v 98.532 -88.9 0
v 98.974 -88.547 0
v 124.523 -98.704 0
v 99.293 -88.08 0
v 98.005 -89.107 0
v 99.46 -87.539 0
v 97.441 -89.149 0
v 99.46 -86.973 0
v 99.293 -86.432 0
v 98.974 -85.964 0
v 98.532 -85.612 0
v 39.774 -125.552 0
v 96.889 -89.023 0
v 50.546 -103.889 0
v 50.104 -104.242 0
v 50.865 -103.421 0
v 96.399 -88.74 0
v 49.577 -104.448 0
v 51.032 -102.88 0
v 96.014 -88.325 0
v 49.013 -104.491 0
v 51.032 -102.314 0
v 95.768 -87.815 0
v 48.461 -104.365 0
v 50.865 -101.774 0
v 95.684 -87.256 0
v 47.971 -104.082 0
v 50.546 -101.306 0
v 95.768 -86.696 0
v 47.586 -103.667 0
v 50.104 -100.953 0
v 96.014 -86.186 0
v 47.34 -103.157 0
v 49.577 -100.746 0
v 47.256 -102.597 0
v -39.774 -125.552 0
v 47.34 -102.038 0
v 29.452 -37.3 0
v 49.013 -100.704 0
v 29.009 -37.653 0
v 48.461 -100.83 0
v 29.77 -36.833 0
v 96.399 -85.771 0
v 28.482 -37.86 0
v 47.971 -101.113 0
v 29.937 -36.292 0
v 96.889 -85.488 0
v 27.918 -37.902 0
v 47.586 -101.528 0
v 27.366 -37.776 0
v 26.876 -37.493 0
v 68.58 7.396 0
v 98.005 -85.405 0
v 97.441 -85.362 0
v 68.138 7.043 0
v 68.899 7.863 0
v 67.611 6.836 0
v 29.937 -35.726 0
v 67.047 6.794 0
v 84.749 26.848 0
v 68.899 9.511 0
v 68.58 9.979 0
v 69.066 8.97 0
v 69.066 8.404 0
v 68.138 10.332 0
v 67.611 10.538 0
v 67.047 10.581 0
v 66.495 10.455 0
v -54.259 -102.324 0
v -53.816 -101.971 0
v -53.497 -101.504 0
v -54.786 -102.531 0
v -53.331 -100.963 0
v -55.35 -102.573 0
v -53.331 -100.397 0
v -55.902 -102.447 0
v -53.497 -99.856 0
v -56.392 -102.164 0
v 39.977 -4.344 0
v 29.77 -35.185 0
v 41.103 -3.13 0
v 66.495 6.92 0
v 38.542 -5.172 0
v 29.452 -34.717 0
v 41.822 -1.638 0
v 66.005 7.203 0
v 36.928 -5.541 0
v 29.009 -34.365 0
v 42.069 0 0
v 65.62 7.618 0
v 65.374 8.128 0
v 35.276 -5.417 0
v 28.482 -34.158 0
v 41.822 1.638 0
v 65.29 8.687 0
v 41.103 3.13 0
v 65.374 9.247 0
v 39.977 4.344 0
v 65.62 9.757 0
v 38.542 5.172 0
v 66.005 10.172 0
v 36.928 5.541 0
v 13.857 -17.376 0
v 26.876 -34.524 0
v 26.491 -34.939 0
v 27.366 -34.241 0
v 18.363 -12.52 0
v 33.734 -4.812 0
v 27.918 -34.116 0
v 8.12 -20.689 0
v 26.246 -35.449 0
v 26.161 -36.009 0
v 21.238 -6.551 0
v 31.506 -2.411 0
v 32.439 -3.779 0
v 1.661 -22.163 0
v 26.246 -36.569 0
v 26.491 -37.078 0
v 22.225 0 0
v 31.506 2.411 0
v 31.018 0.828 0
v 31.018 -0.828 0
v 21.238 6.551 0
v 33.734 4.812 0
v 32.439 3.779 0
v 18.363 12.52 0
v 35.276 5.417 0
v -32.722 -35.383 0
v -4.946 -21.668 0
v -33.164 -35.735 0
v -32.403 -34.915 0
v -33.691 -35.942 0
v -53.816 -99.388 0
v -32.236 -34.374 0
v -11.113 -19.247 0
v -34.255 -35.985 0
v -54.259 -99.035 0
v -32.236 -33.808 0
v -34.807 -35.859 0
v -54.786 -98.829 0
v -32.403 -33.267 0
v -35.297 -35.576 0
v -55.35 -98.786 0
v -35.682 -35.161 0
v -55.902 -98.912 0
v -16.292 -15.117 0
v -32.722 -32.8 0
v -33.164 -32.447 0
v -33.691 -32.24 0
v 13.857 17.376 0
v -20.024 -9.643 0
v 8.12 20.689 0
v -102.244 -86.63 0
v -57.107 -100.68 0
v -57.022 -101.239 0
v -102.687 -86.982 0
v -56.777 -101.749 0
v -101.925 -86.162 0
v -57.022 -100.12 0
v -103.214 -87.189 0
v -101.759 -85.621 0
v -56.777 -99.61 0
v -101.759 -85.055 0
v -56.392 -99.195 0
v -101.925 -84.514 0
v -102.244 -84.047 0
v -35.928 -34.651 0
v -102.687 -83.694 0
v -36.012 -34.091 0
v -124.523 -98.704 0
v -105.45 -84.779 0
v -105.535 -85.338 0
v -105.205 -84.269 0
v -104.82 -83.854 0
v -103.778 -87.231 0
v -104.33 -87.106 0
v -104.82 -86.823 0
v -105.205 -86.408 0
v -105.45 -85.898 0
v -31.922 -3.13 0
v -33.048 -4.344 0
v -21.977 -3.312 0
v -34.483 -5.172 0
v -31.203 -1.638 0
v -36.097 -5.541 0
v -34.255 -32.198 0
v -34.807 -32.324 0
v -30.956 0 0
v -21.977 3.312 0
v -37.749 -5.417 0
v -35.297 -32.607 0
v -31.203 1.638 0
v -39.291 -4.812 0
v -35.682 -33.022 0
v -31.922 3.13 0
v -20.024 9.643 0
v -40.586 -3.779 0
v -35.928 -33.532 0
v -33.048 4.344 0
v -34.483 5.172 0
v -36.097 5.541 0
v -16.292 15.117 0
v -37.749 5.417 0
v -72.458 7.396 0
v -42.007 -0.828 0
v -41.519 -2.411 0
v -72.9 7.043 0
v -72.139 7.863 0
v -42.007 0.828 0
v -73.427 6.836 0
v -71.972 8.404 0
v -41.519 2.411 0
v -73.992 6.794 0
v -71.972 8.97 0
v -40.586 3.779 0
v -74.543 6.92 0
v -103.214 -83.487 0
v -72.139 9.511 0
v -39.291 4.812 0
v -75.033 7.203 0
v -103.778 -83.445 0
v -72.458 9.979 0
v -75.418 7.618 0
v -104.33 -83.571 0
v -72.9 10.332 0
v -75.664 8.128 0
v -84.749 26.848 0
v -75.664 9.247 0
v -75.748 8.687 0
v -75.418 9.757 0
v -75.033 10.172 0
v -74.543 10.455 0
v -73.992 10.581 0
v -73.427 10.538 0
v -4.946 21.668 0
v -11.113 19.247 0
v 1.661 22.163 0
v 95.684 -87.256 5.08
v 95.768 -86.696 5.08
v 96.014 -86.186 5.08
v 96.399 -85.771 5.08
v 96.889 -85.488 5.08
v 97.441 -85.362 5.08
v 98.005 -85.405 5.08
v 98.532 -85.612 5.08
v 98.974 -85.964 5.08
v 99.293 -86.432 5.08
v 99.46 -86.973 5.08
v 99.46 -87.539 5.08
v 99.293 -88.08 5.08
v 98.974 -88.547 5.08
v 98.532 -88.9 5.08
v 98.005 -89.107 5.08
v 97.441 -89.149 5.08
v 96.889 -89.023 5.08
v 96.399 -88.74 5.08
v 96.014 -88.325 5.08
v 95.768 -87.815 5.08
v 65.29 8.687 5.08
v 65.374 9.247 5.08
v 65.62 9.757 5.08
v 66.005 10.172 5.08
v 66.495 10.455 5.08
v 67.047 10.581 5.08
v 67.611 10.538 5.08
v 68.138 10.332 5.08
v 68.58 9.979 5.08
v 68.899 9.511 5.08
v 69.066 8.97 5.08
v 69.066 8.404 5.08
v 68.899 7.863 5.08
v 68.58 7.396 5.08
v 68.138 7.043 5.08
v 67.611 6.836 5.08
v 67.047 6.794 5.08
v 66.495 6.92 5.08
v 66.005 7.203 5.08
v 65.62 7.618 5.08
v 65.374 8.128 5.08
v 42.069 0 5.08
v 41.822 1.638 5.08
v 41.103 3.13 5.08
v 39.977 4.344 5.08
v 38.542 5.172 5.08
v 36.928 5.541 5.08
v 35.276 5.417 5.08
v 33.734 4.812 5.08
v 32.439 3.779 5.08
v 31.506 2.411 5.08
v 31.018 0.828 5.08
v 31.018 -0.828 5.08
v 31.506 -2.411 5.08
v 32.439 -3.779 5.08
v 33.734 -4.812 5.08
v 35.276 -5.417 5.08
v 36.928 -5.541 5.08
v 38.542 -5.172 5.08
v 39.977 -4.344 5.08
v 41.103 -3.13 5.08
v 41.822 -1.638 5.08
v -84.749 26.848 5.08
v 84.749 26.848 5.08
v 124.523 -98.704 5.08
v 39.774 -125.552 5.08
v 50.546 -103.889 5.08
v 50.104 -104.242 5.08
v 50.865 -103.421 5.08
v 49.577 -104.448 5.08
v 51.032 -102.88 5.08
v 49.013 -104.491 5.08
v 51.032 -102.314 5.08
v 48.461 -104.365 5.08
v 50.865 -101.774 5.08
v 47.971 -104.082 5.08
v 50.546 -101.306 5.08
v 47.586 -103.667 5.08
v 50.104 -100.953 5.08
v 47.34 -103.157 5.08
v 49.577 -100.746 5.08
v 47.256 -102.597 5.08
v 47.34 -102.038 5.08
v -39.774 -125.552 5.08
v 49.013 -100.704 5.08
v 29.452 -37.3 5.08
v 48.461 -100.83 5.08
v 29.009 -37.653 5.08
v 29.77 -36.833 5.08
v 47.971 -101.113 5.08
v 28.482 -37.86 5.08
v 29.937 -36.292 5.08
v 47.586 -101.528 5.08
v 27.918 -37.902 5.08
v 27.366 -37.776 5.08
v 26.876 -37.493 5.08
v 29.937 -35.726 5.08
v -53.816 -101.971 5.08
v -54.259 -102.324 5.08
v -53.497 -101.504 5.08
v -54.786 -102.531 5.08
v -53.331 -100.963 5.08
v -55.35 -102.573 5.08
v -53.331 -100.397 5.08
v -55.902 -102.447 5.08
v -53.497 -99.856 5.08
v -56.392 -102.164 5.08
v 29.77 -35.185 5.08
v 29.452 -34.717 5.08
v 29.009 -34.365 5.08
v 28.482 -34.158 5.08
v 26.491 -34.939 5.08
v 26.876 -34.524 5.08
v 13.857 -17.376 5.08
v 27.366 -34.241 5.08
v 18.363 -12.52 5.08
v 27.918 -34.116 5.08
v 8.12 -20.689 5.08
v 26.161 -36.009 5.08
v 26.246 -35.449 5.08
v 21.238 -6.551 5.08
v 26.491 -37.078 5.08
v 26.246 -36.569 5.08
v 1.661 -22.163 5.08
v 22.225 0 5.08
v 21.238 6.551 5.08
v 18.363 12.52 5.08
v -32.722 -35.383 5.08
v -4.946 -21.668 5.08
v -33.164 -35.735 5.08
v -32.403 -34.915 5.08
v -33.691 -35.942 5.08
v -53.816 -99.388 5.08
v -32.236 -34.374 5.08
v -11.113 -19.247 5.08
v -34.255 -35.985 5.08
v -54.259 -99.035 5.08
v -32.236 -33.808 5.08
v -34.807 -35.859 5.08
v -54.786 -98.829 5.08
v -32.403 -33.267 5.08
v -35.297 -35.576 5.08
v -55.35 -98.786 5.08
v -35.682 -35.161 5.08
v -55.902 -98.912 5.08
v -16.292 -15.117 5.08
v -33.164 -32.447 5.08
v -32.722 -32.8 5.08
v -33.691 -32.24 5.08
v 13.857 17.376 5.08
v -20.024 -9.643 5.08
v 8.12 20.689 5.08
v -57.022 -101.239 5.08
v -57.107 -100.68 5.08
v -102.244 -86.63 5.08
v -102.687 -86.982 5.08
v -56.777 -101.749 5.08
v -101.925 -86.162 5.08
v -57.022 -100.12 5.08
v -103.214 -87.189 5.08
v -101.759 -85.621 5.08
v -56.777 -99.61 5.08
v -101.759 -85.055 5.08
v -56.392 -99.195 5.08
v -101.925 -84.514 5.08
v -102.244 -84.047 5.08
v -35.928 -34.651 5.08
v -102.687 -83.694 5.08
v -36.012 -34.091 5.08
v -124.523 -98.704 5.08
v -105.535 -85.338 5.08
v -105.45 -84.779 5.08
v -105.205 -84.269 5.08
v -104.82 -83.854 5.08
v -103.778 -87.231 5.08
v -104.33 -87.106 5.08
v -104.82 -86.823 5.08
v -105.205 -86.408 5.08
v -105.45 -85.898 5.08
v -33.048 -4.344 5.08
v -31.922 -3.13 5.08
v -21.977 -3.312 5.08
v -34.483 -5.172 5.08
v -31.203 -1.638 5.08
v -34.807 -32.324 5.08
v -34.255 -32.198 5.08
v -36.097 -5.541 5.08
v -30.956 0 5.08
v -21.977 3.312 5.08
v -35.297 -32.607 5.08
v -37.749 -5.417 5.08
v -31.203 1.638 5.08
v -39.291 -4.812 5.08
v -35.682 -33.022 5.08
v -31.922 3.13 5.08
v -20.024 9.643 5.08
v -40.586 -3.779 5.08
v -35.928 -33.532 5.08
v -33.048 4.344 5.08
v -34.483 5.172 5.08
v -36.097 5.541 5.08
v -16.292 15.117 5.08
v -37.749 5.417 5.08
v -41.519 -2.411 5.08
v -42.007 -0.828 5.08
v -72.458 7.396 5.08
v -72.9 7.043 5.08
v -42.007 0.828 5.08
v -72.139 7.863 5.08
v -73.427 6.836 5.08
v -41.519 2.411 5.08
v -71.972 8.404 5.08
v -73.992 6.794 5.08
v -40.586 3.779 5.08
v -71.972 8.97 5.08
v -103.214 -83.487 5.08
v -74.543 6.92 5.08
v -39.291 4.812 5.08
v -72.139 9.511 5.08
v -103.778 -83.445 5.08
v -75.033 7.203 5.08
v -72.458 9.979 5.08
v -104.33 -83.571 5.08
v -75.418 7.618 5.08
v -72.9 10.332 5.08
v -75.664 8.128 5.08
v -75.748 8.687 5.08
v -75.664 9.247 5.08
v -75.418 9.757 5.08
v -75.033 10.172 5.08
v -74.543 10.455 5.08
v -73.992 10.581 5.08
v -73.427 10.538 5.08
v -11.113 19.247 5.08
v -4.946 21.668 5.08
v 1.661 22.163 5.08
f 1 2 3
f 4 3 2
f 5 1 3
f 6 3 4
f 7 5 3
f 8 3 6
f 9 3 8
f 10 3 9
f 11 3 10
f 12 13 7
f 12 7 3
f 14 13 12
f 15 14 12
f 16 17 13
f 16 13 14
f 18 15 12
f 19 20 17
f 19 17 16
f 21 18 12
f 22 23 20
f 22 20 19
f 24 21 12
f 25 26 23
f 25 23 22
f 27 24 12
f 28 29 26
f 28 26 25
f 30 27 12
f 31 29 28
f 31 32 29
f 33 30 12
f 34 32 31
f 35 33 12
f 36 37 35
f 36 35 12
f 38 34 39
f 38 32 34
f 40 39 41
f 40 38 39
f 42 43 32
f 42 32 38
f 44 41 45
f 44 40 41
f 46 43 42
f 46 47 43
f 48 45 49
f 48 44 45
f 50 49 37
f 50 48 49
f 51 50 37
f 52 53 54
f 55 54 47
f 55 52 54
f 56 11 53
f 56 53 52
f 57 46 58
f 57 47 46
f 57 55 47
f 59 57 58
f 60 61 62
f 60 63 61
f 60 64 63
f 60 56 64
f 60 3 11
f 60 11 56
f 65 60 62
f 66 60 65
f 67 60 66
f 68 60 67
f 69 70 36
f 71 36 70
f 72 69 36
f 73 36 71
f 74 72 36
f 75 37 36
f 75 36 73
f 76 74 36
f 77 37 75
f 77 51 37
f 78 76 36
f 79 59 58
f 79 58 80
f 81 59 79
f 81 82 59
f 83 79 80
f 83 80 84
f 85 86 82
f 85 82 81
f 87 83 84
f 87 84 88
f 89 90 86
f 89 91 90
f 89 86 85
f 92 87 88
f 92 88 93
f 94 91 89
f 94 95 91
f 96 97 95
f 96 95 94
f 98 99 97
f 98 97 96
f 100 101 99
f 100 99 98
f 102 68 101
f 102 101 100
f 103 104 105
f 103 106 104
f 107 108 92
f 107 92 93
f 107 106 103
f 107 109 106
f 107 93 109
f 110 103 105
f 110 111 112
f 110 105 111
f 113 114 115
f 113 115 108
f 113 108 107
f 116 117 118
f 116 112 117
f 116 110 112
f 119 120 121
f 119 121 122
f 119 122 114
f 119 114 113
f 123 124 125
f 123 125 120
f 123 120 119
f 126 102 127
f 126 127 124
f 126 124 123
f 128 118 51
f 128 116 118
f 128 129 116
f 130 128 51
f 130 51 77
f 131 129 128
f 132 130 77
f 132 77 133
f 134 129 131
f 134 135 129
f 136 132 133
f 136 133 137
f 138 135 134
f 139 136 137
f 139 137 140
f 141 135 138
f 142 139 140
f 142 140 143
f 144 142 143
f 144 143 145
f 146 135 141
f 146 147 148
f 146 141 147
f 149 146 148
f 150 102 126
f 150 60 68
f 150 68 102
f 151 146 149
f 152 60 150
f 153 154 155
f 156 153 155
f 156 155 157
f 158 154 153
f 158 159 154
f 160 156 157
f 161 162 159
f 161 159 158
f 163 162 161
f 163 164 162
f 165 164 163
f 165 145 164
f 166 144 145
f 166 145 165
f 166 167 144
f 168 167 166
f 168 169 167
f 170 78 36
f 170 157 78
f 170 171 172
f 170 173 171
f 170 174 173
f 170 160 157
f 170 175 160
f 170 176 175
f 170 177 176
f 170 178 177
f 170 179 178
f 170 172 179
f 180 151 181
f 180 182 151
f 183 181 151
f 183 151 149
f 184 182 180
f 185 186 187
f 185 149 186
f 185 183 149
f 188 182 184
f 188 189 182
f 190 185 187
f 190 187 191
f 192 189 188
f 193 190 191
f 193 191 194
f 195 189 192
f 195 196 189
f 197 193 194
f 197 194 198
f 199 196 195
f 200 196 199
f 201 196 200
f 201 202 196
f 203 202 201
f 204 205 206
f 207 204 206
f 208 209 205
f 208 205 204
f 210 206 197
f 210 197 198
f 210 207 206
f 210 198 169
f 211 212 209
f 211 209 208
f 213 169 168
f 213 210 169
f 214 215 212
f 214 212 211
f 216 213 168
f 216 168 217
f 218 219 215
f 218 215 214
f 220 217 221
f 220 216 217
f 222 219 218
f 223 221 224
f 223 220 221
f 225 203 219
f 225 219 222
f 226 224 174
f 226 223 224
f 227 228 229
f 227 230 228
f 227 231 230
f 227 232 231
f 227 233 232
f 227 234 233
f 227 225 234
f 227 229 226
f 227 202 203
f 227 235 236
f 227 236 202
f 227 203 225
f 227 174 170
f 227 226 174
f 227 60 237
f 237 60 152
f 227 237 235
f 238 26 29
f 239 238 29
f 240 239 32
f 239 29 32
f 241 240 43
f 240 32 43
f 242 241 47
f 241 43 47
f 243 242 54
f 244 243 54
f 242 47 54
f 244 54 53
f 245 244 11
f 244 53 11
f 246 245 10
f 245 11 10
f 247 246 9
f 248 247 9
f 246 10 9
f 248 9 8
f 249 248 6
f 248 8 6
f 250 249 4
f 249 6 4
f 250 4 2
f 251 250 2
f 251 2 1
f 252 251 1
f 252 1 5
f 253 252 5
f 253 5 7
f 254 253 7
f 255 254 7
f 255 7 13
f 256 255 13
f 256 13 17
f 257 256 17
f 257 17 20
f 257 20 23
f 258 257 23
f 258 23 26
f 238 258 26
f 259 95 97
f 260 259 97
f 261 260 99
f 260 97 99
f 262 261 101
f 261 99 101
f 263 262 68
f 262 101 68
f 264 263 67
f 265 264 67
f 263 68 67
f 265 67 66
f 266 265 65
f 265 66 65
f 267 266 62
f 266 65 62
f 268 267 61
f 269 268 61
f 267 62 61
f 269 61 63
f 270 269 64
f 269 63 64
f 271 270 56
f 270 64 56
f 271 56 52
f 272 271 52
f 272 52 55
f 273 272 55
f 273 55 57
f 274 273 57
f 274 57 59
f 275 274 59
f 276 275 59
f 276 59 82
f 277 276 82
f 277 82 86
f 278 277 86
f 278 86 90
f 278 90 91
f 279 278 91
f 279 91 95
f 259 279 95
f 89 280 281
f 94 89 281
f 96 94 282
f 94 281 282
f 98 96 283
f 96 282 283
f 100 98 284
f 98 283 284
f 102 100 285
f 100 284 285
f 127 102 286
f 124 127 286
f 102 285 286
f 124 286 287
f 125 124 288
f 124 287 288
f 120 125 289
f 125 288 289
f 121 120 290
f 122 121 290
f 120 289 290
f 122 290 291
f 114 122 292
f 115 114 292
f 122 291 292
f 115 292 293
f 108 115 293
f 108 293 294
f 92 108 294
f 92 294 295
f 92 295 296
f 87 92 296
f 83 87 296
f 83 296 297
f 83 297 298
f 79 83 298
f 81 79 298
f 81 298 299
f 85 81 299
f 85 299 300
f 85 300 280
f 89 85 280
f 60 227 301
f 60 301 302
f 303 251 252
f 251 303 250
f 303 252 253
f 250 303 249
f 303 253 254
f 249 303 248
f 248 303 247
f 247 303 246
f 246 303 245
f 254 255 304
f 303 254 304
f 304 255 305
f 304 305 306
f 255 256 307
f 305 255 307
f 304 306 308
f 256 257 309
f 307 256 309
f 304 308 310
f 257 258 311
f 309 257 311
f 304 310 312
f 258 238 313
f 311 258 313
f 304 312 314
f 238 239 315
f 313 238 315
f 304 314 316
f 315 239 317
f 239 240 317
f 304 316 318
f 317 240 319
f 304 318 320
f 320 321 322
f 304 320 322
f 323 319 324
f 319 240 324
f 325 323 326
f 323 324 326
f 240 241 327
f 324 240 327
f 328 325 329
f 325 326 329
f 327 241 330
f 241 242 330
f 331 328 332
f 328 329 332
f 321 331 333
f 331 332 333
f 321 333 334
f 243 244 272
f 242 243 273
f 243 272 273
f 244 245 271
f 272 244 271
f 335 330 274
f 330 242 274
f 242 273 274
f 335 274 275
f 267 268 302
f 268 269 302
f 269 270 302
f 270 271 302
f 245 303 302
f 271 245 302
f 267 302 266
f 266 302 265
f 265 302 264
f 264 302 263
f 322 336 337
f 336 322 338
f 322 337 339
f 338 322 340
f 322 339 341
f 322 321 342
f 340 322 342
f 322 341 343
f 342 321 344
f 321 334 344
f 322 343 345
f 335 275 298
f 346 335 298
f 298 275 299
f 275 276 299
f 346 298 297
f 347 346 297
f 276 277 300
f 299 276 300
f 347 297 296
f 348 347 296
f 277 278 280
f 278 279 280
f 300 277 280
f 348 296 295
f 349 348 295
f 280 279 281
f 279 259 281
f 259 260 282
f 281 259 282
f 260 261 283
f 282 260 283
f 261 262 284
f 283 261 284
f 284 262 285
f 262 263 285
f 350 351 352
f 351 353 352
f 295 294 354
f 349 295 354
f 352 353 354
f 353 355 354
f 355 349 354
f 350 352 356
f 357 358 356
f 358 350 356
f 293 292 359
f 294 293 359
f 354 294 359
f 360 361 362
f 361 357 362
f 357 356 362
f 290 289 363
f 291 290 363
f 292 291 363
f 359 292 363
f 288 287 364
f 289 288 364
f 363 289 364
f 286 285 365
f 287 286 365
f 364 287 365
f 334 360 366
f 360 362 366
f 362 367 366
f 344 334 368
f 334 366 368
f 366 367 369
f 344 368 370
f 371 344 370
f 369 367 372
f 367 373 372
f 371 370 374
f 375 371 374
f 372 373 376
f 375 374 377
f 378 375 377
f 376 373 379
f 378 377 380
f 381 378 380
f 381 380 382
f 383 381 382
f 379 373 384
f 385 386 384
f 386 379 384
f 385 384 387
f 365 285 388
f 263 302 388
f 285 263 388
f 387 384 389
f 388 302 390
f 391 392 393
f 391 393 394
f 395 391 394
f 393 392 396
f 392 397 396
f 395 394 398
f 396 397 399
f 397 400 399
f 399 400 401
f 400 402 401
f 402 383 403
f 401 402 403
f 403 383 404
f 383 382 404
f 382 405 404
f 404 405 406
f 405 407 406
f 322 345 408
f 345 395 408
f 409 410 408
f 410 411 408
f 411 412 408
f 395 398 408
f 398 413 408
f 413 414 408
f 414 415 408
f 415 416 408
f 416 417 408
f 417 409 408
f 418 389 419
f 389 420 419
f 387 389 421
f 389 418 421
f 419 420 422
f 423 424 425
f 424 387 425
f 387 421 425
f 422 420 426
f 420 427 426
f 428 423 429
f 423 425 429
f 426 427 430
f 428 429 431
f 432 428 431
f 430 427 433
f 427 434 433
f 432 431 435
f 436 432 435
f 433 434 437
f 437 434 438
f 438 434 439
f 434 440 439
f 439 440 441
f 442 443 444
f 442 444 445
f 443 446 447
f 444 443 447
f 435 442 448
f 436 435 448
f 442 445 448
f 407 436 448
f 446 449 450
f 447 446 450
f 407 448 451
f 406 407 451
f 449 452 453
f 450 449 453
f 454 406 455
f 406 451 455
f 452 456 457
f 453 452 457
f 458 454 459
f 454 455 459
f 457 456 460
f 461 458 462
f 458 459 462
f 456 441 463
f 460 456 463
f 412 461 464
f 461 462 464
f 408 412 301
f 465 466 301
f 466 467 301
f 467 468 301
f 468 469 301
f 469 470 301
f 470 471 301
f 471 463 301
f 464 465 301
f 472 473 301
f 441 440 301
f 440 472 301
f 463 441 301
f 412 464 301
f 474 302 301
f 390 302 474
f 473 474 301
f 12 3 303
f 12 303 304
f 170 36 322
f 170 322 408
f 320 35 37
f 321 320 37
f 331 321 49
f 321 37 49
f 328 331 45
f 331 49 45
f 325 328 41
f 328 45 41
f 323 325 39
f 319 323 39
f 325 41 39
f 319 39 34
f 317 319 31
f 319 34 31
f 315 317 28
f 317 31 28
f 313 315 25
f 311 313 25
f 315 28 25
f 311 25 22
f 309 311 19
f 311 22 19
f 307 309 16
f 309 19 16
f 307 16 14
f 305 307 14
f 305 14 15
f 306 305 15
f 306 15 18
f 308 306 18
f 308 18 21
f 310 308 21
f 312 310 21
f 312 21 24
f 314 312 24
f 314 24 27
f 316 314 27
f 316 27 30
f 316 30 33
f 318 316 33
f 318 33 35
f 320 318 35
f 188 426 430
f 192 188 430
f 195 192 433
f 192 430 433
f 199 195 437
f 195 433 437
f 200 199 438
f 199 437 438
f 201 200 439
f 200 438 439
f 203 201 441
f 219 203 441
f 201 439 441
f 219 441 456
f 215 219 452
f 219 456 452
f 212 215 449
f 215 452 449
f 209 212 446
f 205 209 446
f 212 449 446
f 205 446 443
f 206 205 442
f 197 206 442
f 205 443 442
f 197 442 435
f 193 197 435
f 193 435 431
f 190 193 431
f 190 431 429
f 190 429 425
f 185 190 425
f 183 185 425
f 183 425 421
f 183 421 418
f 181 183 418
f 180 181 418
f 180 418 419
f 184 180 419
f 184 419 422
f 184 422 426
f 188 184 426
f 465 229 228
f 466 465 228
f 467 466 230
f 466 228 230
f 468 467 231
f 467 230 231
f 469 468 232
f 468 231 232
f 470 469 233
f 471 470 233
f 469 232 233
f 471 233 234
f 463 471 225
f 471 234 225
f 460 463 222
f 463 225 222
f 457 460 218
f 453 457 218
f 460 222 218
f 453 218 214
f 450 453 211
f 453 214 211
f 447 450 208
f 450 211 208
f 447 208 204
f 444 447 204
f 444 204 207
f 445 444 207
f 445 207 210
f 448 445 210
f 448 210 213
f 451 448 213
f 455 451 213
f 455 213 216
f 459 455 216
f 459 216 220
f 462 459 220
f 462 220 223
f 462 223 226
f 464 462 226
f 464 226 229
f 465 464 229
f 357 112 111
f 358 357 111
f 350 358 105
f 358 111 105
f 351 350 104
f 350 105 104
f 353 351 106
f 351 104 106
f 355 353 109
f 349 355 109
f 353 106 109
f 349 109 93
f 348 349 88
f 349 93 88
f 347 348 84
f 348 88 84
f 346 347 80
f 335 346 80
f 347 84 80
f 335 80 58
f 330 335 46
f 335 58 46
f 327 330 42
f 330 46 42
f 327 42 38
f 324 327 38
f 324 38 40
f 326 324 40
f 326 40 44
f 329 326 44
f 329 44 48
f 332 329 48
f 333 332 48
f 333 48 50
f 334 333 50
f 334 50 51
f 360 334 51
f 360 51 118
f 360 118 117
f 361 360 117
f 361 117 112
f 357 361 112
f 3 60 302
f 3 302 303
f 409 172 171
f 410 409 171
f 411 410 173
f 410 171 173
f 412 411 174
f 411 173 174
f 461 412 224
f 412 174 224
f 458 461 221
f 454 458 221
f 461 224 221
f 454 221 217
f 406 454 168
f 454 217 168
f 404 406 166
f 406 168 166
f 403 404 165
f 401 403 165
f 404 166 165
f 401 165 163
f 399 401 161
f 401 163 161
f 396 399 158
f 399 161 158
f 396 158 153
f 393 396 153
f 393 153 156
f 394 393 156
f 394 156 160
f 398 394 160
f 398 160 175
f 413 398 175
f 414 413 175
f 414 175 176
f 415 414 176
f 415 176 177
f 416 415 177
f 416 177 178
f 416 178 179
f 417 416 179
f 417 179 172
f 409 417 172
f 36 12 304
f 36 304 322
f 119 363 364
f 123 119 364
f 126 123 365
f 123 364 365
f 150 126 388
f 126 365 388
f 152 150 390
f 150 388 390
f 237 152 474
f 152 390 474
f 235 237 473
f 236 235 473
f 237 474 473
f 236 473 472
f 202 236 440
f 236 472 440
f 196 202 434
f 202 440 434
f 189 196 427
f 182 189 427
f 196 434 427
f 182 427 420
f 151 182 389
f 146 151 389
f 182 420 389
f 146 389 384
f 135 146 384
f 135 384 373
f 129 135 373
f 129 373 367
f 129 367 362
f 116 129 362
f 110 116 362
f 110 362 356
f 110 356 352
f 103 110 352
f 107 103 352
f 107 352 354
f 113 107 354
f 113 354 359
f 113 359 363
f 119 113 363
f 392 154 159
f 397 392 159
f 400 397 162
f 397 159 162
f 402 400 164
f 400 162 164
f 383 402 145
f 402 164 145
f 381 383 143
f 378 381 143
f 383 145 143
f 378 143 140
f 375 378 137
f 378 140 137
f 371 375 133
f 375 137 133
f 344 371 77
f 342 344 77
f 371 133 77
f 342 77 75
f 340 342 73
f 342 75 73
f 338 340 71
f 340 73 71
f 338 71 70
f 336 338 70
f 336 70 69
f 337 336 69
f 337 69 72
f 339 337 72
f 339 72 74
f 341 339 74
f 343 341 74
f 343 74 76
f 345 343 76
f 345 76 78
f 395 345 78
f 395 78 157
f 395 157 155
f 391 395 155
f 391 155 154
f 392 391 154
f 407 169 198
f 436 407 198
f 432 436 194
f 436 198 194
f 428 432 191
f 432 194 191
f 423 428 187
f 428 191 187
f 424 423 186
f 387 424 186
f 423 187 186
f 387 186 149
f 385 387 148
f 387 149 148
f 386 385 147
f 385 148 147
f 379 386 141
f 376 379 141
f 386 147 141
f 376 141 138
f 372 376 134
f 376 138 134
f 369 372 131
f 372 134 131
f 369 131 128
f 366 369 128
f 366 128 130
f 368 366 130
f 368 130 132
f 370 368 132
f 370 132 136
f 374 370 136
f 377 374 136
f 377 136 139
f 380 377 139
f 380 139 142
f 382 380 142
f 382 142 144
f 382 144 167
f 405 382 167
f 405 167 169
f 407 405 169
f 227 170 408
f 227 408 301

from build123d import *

# Parameters (mm, degrees)
BOSS_EXTRUDE1_DEPTH   = 5.08
SKETCH2_R             = 22.225
SKETCH2_R_2           = 5.55625
CUT_EXTRUDE1_DEPTH    = 6.08
F_6_CLEARANCE_HOLE1_D = 3.7973


with BuildPart() as part:
    # Sketch1 → Boss-Extrude1 (new body)
    with BuildSketch(Plane.XY):
        Polygon((-84.749075787, 26.84779606), (84.749075787, 26.84779606), (124.522960457, -98.704407881), (39.77388467, -125.55220394), (-39.77388467, -125.55220394), (-124.522960457, -98.704407881), align=None)
    extrude(amount=BOSS_EXTRUDE1_DEPTH)

    # Sketch2 → Cut-Extrude1 (cut, through all)
    with BuildSketch(Plane.XY.offset(5.08)):
        Circle(SKETCH2_R)
        with Locations((-36.5125, 0)):
            Circle(SKETCH2_R_2)
        with Locations((36.5125, 0)):
            Circle(SKETCH2_R_2)
    extrude(amount=-CUT_EXTRUDE1_DEPTH, mode=Mode.SUBTRACT)

    # #6 Clearance Hole1 (through all)
    with Locations(Plane.XY.offset(5.08)):
        with Locations((-73.849633462, 8.68727982), (-103.636097768, -85.338140937), (-55.208054461, -100.679738685), (-34.113357557, -34.091179139), (49.154549048, -102.597438404), (97.582592354, -87.255840656), (28.059852144, -36.008878857), (67.188616869, 8.68727982)):
            Hole(F_6_CLEARANCE_HOLE1_D / 2)


solid = part.part
